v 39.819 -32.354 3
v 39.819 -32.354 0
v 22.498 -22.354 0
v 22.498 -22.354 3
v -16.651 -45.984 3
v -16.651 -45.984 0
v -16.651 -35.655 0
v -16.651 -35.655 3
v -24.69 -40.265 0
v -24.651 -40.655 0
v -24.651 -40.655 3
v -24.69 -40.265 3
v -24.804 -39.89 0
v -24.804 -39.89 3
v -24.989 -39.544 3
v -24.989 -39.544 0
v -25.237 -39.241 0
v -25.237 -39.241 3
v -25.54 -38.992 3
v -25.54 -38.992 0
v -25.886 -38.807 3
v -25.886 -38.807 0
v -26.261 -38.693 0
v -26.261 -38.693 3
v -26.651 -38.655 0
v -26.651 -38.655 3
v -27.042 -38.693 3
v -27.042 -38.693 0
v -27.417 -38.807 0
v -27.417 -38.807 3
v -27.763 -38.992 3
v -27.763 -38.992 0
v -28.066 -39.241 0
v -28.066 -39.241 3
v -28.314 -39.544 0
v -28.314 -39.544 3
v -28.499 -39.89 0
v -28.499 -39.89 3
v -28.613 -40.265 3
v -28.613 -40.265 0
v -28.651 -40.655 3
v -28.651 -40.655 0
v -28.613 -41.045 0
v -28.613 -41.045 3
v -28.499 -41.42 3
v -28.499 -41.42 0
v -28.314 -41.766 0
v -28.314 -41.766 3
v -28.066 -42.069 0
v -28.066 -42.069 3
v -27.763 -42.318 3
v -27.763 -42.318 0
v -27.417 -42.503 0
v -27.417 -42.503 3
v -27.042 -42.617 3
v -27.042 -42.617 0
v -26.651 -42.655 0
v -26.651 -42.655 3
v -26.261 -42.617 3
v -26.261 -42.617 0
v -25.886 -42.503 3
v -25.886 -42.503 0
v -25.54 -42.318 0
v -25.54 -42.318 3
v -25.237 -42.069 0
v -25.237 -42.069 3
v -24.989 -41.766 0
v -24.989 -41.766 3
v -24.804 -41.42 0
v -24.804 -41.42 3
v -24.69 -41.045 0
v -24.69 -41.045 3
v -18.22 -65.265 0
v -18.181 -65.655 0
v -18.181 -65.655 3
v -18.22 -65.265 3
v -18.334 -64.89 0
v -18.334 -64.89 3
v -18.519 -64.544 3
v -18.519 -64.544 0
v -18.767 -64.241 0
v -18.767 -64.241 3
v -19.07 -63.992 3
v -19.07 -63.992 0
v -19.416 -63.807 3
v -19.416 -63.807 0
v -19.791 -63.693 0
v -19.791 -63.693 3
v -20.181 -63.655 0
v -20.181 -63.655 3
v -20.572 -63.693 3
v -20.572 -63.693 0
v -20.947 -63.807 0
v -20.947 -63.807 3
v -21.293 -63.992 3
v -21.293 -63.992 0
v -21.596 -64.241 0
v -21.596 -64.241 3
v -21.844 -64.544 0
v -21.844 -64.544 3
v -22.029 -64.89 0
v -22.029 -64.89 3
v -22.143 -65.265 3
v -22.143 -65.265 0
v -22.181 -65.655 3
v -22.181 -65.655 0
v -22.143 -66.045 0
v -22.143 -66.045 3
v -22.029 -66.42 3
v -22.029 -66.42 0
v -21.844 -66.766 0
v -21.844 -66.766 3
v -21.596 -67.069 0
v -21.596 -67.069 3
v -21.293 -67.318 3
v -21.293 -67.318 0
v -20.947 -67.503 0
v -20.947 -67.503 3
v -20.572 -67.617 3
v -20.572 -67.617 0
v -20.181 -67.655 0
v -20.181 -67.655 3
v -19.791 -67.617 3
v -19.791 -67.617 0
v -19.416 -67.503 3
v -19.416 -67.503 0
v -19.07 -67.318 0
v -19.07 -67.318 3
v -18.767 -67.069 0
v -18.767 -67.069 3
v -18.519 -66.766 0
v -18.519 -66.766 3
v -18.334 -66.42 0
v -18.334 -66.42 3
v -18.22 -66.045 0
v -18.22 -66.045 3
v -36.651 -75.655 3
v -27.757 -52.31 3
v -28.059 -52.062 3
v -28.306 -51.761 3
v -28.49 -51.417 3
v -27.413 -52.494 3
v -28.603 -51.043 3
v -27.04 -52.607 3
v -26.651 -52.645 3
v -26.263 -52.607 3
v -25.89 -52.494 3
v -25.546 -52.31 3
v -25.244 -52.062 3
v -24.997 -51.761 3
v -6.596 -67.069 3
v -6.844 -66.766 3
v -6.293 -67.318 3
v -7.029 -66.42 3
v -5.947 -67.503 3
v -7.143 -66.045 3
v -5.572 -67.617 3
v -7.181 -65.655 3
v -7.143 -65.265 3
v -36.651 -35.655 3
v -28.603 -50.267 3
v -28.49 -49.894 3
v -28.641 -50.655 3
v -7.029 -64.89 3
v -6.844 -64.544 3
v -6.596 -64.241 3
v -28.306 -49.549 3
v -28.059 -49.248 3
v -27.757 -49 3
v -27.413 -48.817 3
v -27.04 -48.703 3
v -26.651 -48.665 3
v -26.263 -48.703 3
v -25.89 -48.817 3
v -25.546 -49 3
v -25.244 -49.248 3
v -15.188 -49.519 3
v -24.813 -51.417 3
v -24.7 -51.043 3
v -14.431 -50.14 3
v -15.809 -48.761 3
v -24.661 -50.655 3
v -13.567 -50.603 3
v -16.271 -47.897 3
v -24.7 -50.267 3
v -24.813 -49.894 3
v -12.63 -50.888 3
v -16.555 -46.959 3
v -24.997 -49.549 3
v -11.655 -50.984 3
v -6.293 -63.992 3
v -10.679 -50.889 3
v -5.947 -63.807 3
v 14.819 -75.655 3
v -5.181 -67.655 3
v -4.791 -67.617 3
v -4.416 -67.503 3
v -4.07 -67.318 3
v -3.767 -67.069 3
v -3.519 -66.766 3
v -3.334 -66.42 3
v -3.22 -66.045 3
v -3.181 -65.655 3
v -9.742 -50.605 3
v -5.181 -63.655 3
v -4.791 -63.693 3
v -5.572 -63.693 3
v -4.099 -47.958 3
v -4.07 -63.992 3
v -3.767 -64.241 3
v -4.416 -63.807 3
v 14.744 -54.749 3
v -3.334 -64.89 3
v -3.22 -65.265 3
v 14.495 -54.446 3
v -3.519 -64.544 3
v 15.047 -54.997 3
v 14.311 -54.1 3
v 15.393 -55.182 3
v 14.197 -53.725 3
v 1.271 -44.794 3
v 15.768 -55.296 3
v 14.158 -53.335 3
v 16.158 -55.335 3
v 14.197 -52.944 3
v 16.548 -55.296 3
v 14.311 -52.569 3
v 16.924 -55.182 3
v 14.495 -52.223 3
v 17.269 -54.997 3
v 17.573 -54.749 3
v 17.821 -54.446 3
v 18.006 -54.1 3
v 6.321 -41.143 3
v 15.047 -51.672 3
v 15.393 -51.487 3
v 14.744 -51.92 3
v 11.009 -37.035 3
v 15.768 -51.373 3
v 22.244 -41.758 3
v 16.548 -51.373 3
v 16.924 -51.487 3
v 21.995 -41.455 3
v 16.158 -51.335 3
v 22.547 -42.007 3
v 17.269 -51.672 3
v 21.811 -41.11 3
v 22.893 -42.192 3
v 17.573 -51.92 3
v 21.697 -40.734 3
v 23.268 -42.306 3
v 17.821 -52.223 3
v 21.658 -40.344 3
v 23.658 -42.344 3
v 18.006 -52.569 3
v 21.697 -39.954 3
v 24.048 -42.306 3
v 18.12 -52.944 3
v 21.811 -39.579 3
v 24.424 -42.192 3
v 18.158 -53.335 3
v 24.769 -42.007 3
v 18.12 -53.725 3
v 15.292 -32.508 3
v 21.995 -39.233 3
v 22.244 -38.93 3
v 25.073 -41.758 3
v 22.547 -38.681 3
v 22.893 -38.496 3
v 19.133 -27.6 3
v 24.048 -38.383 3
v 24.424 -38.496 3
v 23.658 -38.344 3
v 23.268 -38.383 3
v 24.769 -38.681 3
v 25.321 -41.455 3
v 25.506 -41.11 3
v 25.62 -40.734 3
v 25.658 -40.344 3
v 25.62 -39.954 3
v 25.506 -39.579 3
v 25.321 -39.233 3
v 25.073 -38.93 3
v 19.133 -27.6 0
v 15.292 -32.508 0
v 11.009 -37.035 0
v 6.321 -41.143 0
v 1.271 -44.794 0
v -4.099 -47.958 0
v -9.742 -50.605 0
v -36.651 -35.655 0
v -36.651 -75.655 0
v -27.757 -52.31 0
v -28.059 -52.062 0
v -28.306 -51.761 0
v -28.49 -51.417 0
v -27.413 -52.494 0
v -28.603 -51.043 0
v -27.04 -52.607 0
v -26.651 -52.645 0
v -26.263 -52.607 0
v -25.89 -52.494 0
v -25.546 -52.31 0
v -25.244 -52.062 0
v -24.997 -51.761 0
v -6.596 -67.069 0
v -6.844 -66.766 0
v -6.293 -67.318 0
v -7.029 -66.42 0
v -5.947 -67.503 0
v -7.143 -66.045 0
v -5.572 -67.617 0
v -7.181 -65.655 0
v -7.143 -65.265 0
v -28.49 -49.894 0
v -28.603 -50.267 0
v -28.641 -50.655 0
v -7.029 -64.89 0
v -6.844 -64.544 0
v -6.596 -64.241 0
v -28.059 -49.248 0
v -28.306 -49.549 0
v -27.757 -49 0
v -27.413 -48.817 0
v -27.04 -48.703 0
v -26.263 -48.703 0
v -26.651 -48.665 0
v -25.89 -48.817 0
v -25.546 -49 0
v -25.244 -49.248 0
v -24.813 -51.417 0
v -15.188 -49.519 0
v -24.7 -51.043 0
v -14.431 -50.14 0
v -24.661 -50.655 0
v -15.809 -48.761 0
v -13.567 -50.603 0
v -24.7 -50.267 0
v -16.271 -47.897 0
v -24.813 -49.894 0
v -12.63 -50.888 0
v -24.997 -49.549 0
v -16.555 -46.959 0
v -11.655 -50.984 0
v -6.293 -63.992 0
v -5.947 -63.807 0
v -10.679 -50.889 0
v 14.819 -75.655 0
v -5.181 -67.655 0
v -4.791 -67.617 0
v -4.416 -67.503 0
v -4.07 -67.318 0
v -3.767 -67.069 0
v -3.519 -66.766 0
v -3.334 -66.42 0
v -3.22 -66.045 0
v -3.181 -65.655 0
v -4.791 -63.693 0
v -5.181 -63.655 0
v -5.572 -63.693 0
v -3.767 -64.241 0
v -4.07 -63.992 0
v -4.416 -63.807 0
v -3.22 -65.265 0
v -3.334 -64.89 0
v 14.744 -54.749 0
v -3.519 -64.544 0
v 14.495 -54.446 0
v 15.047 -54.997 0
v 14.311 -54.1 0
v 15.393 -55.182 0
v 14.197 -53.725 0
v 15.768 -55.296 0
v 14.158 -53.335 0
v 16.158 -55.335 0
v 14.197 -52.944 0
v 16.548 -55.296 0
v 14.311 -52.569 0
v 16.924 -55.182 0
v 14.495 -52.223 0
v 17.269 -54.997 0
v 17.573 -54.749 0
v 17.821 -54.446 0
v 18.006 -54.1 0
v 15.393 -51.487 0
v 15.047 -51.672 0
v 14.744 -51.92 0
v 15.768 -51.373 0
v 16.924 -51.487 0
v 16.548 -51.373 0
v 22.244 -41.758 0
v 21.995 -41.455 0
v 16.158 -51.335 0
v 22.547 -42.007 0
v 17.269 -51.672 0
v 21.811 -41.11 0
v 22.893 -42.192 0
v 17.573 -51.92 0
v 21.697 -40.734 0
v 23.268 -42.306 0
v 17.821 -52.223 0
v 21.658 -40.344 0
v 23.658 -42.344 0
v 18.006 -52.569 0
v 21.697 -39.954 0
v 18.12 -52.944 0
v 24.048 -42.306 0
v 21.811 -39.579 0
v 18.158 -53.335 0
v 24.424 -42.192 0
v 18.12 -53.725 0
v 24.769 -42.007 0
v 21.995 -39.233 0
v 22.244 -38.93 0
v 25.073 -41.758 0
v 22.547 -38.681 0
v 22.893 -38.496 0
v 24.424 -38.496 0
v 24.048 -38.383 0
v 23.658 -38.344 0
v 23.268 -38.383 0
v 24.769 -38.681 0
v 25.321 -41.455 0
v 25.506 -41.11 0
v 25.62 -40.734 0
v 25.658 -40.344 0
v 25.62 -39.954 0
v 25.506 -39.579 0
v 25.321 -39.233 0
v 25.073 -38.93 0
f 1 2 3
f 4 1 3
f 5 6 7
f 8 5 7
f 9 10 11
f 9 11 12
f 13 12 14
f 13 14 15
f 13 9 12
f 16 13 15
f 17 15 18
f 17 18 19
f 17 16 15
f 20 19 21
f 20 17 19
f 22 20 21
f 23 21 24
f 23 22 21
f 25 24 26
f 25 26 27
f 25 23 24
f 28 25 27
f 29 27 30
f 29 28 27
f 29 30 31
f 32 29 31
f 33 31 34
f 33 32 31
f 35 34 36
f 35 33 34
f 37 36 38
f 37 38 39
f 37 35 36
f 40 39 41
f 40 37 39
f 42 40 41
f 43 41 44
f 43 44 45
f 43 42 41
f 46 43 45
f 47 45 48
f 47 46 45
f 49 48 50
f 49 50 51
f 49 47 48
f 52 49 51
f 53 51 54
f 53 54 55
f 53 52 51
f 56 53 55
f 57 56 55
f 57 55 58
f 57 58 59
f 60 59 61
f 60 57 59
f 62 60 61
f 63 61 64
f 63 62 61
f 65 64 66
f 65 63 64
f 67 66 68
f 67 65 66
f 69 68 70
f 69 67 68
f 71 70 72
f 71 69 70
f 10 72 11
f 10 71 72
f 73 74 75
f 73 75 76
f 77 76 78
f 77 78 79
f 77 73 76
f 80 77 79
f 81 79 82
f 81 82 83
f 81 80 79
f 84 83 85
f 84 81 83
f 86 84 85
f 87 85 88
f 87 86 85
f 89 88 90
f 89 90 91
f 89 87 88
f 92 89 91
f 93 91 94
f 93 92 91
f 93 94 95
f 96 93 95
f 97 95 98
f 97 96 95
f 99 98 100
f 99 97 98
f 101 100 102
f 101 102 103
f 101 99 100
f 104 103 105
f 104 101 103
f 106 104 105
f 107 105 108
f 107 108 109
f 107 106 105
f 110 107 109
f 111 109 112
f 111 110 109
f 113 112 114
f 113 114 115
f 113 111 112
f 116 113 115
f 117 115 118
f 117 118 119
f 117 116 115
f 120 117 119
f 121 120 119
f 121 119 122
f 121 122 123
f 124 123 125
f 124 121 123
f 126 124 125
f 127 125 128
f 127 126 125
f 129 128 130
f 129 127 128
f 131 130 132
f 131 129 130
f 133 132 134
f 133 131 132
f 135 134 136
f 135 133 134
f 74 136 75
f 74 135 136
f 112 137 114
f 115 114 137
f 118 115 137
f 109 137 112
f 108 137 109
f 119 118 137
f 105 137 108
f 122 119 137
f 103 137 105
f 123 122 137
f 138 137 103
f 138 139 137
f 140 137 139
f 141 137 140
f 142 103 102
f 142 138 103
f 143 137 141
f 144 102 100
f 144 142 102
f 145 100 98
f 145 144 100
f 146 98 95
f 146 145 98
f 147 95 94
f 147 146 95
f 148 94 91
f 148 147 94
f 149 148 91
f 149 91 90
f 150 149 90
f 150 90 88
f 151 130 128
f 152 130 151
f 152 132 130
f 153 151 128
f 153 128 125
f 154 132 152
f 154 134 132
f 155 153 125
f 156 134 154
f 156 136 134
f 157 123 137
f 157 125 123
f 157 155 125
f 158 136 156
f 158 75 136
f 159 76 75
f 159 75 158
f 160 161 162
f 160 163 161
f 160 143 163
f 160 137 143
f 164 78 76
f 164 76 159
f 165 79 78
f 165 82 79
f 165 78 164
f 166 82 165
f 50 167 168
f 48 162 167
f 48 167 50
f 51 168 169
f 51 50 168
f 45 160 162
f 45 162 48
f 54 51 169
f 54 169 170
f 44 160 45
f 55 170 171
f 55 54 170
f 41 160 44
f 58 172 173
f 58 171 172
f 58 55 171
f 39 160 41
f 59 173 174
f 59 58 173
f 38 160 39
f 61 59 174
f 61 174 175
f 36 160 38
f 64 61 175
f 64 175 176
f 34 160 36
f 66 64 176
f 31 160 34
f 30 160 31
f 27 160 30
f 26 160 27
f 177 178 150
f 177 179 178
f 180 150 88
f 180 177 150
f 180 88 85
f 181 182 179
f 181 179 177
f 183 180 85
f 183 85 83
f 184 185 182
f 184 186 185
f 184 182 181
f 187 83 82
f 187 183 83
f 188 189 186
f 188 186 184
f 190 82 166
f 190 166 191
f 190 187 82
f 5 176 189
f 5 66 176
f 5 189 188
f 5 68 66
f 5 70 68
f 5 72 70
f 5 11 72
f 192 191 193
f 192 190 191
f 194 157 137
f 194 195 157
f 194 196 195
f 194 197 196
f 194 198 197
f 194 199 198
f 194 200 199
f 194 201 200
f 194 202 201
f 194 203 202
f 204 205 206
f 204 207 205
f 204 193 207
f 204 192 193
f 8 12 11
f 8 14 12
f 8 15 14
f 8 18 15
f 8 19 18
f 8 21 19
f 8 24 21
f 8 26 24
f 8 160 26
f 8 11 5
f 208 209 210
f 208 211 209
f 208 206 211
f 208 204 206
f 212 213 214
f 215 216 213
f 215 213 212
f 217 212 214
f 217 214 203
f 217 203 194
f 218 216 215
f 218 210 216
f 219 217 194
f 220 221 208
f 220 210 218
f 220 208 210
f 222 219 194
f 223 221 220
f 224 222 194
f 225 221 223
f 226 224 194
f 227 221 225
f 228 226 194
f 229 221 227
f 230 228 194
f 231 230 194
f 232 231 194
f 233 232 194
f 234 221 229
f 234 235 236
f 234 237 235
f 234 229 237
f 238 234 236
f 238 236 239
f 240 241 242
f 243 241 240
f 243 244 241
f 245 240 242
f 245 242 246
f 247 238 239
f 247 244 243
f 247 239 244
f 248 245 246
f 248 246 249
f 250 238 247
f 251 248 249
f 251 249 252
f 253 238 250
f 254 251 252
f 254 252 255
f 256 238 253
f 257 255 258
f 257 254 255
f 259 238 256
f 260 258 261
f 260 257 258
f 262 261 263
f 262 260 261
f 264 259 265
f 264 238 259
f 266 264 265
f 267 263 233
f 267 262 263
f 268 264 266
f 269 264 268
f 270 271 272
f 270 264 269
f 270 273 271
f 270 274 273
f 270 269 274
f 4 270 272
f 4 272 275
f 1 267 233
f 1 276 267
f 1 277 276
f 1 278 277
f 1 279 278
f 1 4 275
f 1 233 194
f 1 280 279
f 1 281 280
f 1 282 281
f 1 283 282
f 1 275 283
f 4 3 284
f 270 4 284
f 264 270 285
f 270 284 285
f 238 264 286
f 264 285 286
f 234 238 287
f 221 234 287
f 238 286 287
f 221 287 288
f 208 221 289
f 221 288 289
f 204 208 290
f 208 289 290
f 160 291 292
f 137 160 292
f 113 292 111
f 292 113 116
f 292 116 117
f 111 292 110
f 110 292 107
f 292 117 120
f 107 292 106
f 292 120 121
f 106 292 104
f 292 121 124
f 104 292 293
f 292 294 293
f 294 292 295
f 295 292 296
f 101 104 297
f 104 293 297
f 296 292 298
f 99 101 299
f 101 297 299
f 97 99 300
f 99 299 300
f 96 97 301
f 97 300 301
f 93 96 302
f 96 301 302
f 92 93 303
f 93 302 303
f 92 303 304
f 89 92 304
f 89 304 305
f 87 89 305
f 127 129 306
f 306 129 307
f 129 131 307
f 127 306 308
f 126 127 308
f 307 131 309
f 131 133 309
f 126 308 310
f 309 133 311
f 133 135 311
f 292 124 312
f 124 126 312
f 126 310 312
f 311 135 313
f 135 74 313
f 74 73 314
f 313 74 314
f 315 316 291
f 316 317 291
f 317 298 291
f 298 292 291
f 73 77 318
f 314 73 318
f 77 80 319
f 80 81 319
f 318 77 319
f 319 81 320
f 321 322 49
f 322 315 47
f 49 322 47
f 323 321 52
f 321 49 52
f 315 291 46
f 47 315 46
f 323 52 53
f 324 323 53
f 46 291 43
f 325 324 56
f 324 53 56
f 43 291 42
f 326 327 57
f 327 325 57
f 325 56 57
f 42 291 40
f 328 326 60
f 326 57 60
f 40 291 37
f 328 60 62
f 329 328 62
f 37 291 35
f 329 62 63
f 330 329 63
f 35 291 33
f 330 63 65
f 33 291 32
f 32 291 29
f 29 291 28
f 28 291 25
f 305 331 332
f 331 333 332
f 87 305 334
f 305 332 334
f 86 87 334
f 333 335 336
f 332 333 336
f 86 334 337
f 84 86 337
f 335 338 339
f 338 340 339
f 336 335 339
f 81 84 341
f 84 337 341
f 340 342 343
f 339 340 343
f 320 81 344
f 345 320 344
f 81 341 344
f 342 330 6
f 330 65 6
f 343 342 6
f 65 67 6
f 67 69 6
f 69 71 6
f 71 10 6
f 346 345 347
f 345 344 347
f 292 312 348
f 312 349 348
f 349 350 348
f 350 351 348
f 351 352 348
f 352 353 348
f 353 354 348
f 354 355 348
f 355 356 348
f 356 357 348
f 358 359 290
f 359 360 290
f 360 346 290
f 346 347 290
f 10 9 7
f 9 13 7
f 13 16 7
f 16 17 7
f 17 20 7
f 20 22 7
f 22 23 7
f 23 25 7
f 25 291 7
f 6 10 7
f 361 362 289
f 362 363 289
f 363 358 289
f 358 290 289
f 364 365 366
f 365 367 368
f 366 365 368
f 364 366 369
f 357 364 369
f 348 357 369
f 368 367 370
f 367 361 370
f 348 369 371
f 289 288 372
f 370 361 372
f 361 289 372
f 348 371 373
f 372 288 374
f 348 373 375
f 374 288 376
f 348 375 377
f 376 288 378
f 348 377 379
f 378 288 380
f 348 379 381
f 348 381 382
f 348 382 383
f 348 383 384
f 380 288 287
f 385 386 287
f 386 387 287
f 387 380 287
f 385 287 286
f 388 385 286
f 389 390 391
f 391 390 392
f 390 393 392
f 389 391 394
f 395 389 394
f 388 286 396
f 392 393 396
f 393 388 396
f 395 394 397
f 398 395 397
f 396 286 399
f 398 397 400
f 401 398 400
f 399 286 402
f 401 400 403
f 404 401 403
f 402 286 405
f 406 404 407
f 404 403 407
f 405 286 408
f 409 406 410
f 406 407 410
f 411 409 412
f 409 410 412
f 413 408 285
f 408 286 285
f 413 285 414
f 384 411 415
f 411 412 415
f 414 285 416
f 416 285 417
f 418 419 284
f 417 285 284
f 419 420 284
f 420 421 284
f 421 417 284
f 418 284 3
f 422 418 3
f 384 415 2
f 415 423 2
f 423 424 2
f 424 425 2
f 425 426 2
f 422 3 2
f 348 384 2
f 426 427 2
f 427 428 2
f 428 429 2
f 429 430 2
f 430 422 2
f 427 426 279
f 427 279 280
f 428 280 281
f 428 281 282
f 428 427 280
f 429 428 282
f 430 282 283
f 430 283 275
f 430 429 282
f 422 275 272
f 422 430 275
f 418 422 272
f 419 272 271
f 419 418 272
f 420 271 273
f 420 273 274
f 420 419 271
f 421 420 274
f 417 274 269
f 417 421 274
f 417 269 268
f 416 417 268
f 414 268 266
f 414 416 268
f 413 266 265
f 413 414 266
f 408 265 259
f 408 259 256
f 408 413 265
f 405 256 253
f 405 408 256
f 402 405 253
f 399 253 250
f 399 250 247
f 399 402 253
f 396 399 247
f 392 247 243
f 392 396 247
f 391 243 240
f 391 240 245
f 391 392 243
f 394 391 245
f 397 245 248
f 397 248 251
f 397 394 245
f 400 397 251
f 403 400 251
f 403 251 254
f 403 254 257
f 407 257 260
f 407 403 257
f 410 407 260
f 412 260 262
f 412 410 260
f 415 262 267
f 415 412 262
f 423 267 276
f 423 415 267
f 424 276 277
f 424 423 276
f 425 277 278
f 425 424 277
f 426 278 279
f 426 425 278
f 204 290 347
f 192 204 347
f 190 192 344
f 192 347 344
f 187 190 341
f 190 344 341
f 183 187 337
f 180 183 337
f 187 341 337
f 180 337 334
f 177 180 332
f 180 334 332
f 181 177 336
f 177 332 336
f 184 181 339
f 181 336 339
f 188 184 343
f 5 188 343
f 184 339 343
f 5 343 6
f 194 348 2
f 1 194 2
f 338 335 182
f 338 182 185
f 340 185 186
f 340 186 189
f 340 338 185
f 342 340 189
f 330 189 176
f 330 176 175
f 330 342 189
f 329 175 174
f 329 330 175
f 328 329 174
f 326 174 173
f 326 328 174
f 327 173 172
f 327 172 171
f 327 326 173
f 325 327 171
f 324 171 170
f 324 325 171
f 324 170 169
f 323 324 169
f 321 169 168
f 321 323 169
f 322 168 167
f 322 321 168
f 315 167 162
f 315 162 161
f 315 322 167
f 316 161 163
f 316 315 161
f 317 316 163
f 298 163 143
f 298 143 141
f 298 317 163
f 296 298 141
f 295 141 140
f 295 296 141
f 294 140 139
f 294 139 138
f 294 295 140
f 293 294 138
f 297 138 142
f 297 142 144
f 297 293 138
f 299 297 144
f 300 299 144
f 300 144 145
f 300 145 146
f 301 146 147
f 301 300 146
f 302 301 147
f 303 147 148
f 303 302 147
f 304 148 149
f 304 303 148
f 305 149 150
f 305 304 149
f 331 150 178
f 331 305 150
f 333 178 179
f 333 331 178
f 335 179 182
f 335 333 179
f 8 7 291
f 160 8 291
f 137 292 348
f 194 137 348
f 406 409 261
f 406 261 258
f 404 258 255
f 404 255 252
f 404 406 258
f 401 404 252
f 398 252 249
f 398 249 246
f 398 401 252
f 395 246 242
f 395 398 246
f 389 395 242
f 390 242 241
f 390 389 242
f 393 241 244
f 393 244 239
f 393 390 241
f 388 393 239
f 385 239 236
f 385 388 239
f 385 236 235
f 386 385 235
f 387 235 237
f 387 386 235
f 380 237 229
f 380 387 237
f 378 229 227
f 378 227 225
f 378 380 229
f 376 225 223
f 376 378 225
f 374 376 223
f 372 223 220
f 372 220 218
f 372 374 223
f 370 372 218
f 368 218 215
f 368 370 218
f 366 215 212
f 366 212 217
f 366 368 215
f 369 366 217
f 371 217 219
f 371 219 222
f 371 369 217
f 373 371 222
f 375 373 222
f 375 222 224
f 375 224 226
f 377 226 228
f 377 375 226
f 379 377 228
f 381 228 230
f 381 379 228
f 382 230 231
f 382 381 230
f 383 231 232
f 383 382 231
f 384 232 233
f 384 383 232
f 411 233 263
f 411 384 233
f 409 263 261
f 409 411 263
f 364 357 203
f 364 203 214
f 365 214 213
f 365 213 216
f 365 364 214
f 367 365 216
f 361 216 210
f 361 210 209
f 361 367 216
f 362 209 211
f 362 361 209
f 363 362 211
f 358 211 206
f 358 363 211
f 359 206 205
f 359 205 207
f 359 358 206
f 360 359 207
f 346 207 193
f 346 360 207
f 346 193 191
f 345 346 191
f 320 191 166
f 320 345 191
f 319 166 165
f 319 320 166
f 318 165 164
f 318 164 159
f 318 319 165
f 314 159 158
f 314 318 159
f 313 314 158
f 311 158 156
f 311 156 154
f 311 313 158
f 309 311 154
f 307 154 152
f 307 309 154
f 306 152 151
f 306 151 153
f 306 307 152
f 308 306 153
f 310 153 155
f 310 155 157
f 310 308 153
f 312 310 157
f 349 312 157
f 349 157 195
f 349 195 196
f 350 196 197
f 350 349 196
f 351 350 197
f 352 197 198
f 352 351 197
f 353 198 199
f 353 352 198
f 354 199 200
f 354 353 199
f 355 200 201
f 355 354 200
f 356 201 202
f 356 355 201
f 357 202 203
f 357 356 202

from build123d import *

# Parameters (mm, degrees)
SKETCH_1_R      = 2
SKETCH_1_R_2    = 1.99
EXTRUDE_1_DEPTH = 3


with BuildPart() as part:
    # 草图1 → 凸台-拉伸1 (new body)
    with BuildSketch(Plane.XY):
        with BuildLine():
            Line((-16.651457747, -45.984160086), (-16.651457747, -35.65505653))
            Line((-16.651457747, -35.65505653), (-36.651457747, -35.65505653))
            Line((-36.651457747, -35.65505653), (-36.651457747, -75.65505653))
            Line((-36.651457747, -75.65505653), (14.818542253, -75.65505653))
            Line((14.818542253, -75.65505653), (39.818542253, -32.353786341))
            Line((39.818542253, -32.353786341), (22.498034177, -22.353786341))
            ThreePointArc((22.498034177, -22.353786341), (8.713172451, -39.144030649), (-9.741633911, -50.605044516))
            ThreePointArc((-9.741633911, -50.605044516), (-14.430925396, -50.140427593), (-16.651457747, -45.984160086))
        make_face()
        with Locations((-26.651457747, -40.65505653)):
            Circle(SKETCH_1_R, mode=Mode.SUBTRACT)
        with Locations((-26.651457747, -50.65505653)):
            Circle(SKETCH_1_R_2, mode=Mode.SUBTRACT)
        with Locations((-20.181457747, -65.65505653)):
            Circle(SKETCH_1_R, mode=Mode.SUBTRACT)
        with Locations((-5.181457747, -65.65505653)):
            Circle(SKETCH_1_R, mode=Mode.SUBTRACT)
        with Locations((16.158288215, -53.334548455)):
            Circle(SKETCH_1_R, mode=Mode.SUBTRACT)
        with Locations((23.658288215, -40.344167398)):
            Circle(SKETCH_1_R, mode=Mode.SUBTRACT)
    extrude(amount=EXTRUDE_1_DEPTH)


solid = part.part
